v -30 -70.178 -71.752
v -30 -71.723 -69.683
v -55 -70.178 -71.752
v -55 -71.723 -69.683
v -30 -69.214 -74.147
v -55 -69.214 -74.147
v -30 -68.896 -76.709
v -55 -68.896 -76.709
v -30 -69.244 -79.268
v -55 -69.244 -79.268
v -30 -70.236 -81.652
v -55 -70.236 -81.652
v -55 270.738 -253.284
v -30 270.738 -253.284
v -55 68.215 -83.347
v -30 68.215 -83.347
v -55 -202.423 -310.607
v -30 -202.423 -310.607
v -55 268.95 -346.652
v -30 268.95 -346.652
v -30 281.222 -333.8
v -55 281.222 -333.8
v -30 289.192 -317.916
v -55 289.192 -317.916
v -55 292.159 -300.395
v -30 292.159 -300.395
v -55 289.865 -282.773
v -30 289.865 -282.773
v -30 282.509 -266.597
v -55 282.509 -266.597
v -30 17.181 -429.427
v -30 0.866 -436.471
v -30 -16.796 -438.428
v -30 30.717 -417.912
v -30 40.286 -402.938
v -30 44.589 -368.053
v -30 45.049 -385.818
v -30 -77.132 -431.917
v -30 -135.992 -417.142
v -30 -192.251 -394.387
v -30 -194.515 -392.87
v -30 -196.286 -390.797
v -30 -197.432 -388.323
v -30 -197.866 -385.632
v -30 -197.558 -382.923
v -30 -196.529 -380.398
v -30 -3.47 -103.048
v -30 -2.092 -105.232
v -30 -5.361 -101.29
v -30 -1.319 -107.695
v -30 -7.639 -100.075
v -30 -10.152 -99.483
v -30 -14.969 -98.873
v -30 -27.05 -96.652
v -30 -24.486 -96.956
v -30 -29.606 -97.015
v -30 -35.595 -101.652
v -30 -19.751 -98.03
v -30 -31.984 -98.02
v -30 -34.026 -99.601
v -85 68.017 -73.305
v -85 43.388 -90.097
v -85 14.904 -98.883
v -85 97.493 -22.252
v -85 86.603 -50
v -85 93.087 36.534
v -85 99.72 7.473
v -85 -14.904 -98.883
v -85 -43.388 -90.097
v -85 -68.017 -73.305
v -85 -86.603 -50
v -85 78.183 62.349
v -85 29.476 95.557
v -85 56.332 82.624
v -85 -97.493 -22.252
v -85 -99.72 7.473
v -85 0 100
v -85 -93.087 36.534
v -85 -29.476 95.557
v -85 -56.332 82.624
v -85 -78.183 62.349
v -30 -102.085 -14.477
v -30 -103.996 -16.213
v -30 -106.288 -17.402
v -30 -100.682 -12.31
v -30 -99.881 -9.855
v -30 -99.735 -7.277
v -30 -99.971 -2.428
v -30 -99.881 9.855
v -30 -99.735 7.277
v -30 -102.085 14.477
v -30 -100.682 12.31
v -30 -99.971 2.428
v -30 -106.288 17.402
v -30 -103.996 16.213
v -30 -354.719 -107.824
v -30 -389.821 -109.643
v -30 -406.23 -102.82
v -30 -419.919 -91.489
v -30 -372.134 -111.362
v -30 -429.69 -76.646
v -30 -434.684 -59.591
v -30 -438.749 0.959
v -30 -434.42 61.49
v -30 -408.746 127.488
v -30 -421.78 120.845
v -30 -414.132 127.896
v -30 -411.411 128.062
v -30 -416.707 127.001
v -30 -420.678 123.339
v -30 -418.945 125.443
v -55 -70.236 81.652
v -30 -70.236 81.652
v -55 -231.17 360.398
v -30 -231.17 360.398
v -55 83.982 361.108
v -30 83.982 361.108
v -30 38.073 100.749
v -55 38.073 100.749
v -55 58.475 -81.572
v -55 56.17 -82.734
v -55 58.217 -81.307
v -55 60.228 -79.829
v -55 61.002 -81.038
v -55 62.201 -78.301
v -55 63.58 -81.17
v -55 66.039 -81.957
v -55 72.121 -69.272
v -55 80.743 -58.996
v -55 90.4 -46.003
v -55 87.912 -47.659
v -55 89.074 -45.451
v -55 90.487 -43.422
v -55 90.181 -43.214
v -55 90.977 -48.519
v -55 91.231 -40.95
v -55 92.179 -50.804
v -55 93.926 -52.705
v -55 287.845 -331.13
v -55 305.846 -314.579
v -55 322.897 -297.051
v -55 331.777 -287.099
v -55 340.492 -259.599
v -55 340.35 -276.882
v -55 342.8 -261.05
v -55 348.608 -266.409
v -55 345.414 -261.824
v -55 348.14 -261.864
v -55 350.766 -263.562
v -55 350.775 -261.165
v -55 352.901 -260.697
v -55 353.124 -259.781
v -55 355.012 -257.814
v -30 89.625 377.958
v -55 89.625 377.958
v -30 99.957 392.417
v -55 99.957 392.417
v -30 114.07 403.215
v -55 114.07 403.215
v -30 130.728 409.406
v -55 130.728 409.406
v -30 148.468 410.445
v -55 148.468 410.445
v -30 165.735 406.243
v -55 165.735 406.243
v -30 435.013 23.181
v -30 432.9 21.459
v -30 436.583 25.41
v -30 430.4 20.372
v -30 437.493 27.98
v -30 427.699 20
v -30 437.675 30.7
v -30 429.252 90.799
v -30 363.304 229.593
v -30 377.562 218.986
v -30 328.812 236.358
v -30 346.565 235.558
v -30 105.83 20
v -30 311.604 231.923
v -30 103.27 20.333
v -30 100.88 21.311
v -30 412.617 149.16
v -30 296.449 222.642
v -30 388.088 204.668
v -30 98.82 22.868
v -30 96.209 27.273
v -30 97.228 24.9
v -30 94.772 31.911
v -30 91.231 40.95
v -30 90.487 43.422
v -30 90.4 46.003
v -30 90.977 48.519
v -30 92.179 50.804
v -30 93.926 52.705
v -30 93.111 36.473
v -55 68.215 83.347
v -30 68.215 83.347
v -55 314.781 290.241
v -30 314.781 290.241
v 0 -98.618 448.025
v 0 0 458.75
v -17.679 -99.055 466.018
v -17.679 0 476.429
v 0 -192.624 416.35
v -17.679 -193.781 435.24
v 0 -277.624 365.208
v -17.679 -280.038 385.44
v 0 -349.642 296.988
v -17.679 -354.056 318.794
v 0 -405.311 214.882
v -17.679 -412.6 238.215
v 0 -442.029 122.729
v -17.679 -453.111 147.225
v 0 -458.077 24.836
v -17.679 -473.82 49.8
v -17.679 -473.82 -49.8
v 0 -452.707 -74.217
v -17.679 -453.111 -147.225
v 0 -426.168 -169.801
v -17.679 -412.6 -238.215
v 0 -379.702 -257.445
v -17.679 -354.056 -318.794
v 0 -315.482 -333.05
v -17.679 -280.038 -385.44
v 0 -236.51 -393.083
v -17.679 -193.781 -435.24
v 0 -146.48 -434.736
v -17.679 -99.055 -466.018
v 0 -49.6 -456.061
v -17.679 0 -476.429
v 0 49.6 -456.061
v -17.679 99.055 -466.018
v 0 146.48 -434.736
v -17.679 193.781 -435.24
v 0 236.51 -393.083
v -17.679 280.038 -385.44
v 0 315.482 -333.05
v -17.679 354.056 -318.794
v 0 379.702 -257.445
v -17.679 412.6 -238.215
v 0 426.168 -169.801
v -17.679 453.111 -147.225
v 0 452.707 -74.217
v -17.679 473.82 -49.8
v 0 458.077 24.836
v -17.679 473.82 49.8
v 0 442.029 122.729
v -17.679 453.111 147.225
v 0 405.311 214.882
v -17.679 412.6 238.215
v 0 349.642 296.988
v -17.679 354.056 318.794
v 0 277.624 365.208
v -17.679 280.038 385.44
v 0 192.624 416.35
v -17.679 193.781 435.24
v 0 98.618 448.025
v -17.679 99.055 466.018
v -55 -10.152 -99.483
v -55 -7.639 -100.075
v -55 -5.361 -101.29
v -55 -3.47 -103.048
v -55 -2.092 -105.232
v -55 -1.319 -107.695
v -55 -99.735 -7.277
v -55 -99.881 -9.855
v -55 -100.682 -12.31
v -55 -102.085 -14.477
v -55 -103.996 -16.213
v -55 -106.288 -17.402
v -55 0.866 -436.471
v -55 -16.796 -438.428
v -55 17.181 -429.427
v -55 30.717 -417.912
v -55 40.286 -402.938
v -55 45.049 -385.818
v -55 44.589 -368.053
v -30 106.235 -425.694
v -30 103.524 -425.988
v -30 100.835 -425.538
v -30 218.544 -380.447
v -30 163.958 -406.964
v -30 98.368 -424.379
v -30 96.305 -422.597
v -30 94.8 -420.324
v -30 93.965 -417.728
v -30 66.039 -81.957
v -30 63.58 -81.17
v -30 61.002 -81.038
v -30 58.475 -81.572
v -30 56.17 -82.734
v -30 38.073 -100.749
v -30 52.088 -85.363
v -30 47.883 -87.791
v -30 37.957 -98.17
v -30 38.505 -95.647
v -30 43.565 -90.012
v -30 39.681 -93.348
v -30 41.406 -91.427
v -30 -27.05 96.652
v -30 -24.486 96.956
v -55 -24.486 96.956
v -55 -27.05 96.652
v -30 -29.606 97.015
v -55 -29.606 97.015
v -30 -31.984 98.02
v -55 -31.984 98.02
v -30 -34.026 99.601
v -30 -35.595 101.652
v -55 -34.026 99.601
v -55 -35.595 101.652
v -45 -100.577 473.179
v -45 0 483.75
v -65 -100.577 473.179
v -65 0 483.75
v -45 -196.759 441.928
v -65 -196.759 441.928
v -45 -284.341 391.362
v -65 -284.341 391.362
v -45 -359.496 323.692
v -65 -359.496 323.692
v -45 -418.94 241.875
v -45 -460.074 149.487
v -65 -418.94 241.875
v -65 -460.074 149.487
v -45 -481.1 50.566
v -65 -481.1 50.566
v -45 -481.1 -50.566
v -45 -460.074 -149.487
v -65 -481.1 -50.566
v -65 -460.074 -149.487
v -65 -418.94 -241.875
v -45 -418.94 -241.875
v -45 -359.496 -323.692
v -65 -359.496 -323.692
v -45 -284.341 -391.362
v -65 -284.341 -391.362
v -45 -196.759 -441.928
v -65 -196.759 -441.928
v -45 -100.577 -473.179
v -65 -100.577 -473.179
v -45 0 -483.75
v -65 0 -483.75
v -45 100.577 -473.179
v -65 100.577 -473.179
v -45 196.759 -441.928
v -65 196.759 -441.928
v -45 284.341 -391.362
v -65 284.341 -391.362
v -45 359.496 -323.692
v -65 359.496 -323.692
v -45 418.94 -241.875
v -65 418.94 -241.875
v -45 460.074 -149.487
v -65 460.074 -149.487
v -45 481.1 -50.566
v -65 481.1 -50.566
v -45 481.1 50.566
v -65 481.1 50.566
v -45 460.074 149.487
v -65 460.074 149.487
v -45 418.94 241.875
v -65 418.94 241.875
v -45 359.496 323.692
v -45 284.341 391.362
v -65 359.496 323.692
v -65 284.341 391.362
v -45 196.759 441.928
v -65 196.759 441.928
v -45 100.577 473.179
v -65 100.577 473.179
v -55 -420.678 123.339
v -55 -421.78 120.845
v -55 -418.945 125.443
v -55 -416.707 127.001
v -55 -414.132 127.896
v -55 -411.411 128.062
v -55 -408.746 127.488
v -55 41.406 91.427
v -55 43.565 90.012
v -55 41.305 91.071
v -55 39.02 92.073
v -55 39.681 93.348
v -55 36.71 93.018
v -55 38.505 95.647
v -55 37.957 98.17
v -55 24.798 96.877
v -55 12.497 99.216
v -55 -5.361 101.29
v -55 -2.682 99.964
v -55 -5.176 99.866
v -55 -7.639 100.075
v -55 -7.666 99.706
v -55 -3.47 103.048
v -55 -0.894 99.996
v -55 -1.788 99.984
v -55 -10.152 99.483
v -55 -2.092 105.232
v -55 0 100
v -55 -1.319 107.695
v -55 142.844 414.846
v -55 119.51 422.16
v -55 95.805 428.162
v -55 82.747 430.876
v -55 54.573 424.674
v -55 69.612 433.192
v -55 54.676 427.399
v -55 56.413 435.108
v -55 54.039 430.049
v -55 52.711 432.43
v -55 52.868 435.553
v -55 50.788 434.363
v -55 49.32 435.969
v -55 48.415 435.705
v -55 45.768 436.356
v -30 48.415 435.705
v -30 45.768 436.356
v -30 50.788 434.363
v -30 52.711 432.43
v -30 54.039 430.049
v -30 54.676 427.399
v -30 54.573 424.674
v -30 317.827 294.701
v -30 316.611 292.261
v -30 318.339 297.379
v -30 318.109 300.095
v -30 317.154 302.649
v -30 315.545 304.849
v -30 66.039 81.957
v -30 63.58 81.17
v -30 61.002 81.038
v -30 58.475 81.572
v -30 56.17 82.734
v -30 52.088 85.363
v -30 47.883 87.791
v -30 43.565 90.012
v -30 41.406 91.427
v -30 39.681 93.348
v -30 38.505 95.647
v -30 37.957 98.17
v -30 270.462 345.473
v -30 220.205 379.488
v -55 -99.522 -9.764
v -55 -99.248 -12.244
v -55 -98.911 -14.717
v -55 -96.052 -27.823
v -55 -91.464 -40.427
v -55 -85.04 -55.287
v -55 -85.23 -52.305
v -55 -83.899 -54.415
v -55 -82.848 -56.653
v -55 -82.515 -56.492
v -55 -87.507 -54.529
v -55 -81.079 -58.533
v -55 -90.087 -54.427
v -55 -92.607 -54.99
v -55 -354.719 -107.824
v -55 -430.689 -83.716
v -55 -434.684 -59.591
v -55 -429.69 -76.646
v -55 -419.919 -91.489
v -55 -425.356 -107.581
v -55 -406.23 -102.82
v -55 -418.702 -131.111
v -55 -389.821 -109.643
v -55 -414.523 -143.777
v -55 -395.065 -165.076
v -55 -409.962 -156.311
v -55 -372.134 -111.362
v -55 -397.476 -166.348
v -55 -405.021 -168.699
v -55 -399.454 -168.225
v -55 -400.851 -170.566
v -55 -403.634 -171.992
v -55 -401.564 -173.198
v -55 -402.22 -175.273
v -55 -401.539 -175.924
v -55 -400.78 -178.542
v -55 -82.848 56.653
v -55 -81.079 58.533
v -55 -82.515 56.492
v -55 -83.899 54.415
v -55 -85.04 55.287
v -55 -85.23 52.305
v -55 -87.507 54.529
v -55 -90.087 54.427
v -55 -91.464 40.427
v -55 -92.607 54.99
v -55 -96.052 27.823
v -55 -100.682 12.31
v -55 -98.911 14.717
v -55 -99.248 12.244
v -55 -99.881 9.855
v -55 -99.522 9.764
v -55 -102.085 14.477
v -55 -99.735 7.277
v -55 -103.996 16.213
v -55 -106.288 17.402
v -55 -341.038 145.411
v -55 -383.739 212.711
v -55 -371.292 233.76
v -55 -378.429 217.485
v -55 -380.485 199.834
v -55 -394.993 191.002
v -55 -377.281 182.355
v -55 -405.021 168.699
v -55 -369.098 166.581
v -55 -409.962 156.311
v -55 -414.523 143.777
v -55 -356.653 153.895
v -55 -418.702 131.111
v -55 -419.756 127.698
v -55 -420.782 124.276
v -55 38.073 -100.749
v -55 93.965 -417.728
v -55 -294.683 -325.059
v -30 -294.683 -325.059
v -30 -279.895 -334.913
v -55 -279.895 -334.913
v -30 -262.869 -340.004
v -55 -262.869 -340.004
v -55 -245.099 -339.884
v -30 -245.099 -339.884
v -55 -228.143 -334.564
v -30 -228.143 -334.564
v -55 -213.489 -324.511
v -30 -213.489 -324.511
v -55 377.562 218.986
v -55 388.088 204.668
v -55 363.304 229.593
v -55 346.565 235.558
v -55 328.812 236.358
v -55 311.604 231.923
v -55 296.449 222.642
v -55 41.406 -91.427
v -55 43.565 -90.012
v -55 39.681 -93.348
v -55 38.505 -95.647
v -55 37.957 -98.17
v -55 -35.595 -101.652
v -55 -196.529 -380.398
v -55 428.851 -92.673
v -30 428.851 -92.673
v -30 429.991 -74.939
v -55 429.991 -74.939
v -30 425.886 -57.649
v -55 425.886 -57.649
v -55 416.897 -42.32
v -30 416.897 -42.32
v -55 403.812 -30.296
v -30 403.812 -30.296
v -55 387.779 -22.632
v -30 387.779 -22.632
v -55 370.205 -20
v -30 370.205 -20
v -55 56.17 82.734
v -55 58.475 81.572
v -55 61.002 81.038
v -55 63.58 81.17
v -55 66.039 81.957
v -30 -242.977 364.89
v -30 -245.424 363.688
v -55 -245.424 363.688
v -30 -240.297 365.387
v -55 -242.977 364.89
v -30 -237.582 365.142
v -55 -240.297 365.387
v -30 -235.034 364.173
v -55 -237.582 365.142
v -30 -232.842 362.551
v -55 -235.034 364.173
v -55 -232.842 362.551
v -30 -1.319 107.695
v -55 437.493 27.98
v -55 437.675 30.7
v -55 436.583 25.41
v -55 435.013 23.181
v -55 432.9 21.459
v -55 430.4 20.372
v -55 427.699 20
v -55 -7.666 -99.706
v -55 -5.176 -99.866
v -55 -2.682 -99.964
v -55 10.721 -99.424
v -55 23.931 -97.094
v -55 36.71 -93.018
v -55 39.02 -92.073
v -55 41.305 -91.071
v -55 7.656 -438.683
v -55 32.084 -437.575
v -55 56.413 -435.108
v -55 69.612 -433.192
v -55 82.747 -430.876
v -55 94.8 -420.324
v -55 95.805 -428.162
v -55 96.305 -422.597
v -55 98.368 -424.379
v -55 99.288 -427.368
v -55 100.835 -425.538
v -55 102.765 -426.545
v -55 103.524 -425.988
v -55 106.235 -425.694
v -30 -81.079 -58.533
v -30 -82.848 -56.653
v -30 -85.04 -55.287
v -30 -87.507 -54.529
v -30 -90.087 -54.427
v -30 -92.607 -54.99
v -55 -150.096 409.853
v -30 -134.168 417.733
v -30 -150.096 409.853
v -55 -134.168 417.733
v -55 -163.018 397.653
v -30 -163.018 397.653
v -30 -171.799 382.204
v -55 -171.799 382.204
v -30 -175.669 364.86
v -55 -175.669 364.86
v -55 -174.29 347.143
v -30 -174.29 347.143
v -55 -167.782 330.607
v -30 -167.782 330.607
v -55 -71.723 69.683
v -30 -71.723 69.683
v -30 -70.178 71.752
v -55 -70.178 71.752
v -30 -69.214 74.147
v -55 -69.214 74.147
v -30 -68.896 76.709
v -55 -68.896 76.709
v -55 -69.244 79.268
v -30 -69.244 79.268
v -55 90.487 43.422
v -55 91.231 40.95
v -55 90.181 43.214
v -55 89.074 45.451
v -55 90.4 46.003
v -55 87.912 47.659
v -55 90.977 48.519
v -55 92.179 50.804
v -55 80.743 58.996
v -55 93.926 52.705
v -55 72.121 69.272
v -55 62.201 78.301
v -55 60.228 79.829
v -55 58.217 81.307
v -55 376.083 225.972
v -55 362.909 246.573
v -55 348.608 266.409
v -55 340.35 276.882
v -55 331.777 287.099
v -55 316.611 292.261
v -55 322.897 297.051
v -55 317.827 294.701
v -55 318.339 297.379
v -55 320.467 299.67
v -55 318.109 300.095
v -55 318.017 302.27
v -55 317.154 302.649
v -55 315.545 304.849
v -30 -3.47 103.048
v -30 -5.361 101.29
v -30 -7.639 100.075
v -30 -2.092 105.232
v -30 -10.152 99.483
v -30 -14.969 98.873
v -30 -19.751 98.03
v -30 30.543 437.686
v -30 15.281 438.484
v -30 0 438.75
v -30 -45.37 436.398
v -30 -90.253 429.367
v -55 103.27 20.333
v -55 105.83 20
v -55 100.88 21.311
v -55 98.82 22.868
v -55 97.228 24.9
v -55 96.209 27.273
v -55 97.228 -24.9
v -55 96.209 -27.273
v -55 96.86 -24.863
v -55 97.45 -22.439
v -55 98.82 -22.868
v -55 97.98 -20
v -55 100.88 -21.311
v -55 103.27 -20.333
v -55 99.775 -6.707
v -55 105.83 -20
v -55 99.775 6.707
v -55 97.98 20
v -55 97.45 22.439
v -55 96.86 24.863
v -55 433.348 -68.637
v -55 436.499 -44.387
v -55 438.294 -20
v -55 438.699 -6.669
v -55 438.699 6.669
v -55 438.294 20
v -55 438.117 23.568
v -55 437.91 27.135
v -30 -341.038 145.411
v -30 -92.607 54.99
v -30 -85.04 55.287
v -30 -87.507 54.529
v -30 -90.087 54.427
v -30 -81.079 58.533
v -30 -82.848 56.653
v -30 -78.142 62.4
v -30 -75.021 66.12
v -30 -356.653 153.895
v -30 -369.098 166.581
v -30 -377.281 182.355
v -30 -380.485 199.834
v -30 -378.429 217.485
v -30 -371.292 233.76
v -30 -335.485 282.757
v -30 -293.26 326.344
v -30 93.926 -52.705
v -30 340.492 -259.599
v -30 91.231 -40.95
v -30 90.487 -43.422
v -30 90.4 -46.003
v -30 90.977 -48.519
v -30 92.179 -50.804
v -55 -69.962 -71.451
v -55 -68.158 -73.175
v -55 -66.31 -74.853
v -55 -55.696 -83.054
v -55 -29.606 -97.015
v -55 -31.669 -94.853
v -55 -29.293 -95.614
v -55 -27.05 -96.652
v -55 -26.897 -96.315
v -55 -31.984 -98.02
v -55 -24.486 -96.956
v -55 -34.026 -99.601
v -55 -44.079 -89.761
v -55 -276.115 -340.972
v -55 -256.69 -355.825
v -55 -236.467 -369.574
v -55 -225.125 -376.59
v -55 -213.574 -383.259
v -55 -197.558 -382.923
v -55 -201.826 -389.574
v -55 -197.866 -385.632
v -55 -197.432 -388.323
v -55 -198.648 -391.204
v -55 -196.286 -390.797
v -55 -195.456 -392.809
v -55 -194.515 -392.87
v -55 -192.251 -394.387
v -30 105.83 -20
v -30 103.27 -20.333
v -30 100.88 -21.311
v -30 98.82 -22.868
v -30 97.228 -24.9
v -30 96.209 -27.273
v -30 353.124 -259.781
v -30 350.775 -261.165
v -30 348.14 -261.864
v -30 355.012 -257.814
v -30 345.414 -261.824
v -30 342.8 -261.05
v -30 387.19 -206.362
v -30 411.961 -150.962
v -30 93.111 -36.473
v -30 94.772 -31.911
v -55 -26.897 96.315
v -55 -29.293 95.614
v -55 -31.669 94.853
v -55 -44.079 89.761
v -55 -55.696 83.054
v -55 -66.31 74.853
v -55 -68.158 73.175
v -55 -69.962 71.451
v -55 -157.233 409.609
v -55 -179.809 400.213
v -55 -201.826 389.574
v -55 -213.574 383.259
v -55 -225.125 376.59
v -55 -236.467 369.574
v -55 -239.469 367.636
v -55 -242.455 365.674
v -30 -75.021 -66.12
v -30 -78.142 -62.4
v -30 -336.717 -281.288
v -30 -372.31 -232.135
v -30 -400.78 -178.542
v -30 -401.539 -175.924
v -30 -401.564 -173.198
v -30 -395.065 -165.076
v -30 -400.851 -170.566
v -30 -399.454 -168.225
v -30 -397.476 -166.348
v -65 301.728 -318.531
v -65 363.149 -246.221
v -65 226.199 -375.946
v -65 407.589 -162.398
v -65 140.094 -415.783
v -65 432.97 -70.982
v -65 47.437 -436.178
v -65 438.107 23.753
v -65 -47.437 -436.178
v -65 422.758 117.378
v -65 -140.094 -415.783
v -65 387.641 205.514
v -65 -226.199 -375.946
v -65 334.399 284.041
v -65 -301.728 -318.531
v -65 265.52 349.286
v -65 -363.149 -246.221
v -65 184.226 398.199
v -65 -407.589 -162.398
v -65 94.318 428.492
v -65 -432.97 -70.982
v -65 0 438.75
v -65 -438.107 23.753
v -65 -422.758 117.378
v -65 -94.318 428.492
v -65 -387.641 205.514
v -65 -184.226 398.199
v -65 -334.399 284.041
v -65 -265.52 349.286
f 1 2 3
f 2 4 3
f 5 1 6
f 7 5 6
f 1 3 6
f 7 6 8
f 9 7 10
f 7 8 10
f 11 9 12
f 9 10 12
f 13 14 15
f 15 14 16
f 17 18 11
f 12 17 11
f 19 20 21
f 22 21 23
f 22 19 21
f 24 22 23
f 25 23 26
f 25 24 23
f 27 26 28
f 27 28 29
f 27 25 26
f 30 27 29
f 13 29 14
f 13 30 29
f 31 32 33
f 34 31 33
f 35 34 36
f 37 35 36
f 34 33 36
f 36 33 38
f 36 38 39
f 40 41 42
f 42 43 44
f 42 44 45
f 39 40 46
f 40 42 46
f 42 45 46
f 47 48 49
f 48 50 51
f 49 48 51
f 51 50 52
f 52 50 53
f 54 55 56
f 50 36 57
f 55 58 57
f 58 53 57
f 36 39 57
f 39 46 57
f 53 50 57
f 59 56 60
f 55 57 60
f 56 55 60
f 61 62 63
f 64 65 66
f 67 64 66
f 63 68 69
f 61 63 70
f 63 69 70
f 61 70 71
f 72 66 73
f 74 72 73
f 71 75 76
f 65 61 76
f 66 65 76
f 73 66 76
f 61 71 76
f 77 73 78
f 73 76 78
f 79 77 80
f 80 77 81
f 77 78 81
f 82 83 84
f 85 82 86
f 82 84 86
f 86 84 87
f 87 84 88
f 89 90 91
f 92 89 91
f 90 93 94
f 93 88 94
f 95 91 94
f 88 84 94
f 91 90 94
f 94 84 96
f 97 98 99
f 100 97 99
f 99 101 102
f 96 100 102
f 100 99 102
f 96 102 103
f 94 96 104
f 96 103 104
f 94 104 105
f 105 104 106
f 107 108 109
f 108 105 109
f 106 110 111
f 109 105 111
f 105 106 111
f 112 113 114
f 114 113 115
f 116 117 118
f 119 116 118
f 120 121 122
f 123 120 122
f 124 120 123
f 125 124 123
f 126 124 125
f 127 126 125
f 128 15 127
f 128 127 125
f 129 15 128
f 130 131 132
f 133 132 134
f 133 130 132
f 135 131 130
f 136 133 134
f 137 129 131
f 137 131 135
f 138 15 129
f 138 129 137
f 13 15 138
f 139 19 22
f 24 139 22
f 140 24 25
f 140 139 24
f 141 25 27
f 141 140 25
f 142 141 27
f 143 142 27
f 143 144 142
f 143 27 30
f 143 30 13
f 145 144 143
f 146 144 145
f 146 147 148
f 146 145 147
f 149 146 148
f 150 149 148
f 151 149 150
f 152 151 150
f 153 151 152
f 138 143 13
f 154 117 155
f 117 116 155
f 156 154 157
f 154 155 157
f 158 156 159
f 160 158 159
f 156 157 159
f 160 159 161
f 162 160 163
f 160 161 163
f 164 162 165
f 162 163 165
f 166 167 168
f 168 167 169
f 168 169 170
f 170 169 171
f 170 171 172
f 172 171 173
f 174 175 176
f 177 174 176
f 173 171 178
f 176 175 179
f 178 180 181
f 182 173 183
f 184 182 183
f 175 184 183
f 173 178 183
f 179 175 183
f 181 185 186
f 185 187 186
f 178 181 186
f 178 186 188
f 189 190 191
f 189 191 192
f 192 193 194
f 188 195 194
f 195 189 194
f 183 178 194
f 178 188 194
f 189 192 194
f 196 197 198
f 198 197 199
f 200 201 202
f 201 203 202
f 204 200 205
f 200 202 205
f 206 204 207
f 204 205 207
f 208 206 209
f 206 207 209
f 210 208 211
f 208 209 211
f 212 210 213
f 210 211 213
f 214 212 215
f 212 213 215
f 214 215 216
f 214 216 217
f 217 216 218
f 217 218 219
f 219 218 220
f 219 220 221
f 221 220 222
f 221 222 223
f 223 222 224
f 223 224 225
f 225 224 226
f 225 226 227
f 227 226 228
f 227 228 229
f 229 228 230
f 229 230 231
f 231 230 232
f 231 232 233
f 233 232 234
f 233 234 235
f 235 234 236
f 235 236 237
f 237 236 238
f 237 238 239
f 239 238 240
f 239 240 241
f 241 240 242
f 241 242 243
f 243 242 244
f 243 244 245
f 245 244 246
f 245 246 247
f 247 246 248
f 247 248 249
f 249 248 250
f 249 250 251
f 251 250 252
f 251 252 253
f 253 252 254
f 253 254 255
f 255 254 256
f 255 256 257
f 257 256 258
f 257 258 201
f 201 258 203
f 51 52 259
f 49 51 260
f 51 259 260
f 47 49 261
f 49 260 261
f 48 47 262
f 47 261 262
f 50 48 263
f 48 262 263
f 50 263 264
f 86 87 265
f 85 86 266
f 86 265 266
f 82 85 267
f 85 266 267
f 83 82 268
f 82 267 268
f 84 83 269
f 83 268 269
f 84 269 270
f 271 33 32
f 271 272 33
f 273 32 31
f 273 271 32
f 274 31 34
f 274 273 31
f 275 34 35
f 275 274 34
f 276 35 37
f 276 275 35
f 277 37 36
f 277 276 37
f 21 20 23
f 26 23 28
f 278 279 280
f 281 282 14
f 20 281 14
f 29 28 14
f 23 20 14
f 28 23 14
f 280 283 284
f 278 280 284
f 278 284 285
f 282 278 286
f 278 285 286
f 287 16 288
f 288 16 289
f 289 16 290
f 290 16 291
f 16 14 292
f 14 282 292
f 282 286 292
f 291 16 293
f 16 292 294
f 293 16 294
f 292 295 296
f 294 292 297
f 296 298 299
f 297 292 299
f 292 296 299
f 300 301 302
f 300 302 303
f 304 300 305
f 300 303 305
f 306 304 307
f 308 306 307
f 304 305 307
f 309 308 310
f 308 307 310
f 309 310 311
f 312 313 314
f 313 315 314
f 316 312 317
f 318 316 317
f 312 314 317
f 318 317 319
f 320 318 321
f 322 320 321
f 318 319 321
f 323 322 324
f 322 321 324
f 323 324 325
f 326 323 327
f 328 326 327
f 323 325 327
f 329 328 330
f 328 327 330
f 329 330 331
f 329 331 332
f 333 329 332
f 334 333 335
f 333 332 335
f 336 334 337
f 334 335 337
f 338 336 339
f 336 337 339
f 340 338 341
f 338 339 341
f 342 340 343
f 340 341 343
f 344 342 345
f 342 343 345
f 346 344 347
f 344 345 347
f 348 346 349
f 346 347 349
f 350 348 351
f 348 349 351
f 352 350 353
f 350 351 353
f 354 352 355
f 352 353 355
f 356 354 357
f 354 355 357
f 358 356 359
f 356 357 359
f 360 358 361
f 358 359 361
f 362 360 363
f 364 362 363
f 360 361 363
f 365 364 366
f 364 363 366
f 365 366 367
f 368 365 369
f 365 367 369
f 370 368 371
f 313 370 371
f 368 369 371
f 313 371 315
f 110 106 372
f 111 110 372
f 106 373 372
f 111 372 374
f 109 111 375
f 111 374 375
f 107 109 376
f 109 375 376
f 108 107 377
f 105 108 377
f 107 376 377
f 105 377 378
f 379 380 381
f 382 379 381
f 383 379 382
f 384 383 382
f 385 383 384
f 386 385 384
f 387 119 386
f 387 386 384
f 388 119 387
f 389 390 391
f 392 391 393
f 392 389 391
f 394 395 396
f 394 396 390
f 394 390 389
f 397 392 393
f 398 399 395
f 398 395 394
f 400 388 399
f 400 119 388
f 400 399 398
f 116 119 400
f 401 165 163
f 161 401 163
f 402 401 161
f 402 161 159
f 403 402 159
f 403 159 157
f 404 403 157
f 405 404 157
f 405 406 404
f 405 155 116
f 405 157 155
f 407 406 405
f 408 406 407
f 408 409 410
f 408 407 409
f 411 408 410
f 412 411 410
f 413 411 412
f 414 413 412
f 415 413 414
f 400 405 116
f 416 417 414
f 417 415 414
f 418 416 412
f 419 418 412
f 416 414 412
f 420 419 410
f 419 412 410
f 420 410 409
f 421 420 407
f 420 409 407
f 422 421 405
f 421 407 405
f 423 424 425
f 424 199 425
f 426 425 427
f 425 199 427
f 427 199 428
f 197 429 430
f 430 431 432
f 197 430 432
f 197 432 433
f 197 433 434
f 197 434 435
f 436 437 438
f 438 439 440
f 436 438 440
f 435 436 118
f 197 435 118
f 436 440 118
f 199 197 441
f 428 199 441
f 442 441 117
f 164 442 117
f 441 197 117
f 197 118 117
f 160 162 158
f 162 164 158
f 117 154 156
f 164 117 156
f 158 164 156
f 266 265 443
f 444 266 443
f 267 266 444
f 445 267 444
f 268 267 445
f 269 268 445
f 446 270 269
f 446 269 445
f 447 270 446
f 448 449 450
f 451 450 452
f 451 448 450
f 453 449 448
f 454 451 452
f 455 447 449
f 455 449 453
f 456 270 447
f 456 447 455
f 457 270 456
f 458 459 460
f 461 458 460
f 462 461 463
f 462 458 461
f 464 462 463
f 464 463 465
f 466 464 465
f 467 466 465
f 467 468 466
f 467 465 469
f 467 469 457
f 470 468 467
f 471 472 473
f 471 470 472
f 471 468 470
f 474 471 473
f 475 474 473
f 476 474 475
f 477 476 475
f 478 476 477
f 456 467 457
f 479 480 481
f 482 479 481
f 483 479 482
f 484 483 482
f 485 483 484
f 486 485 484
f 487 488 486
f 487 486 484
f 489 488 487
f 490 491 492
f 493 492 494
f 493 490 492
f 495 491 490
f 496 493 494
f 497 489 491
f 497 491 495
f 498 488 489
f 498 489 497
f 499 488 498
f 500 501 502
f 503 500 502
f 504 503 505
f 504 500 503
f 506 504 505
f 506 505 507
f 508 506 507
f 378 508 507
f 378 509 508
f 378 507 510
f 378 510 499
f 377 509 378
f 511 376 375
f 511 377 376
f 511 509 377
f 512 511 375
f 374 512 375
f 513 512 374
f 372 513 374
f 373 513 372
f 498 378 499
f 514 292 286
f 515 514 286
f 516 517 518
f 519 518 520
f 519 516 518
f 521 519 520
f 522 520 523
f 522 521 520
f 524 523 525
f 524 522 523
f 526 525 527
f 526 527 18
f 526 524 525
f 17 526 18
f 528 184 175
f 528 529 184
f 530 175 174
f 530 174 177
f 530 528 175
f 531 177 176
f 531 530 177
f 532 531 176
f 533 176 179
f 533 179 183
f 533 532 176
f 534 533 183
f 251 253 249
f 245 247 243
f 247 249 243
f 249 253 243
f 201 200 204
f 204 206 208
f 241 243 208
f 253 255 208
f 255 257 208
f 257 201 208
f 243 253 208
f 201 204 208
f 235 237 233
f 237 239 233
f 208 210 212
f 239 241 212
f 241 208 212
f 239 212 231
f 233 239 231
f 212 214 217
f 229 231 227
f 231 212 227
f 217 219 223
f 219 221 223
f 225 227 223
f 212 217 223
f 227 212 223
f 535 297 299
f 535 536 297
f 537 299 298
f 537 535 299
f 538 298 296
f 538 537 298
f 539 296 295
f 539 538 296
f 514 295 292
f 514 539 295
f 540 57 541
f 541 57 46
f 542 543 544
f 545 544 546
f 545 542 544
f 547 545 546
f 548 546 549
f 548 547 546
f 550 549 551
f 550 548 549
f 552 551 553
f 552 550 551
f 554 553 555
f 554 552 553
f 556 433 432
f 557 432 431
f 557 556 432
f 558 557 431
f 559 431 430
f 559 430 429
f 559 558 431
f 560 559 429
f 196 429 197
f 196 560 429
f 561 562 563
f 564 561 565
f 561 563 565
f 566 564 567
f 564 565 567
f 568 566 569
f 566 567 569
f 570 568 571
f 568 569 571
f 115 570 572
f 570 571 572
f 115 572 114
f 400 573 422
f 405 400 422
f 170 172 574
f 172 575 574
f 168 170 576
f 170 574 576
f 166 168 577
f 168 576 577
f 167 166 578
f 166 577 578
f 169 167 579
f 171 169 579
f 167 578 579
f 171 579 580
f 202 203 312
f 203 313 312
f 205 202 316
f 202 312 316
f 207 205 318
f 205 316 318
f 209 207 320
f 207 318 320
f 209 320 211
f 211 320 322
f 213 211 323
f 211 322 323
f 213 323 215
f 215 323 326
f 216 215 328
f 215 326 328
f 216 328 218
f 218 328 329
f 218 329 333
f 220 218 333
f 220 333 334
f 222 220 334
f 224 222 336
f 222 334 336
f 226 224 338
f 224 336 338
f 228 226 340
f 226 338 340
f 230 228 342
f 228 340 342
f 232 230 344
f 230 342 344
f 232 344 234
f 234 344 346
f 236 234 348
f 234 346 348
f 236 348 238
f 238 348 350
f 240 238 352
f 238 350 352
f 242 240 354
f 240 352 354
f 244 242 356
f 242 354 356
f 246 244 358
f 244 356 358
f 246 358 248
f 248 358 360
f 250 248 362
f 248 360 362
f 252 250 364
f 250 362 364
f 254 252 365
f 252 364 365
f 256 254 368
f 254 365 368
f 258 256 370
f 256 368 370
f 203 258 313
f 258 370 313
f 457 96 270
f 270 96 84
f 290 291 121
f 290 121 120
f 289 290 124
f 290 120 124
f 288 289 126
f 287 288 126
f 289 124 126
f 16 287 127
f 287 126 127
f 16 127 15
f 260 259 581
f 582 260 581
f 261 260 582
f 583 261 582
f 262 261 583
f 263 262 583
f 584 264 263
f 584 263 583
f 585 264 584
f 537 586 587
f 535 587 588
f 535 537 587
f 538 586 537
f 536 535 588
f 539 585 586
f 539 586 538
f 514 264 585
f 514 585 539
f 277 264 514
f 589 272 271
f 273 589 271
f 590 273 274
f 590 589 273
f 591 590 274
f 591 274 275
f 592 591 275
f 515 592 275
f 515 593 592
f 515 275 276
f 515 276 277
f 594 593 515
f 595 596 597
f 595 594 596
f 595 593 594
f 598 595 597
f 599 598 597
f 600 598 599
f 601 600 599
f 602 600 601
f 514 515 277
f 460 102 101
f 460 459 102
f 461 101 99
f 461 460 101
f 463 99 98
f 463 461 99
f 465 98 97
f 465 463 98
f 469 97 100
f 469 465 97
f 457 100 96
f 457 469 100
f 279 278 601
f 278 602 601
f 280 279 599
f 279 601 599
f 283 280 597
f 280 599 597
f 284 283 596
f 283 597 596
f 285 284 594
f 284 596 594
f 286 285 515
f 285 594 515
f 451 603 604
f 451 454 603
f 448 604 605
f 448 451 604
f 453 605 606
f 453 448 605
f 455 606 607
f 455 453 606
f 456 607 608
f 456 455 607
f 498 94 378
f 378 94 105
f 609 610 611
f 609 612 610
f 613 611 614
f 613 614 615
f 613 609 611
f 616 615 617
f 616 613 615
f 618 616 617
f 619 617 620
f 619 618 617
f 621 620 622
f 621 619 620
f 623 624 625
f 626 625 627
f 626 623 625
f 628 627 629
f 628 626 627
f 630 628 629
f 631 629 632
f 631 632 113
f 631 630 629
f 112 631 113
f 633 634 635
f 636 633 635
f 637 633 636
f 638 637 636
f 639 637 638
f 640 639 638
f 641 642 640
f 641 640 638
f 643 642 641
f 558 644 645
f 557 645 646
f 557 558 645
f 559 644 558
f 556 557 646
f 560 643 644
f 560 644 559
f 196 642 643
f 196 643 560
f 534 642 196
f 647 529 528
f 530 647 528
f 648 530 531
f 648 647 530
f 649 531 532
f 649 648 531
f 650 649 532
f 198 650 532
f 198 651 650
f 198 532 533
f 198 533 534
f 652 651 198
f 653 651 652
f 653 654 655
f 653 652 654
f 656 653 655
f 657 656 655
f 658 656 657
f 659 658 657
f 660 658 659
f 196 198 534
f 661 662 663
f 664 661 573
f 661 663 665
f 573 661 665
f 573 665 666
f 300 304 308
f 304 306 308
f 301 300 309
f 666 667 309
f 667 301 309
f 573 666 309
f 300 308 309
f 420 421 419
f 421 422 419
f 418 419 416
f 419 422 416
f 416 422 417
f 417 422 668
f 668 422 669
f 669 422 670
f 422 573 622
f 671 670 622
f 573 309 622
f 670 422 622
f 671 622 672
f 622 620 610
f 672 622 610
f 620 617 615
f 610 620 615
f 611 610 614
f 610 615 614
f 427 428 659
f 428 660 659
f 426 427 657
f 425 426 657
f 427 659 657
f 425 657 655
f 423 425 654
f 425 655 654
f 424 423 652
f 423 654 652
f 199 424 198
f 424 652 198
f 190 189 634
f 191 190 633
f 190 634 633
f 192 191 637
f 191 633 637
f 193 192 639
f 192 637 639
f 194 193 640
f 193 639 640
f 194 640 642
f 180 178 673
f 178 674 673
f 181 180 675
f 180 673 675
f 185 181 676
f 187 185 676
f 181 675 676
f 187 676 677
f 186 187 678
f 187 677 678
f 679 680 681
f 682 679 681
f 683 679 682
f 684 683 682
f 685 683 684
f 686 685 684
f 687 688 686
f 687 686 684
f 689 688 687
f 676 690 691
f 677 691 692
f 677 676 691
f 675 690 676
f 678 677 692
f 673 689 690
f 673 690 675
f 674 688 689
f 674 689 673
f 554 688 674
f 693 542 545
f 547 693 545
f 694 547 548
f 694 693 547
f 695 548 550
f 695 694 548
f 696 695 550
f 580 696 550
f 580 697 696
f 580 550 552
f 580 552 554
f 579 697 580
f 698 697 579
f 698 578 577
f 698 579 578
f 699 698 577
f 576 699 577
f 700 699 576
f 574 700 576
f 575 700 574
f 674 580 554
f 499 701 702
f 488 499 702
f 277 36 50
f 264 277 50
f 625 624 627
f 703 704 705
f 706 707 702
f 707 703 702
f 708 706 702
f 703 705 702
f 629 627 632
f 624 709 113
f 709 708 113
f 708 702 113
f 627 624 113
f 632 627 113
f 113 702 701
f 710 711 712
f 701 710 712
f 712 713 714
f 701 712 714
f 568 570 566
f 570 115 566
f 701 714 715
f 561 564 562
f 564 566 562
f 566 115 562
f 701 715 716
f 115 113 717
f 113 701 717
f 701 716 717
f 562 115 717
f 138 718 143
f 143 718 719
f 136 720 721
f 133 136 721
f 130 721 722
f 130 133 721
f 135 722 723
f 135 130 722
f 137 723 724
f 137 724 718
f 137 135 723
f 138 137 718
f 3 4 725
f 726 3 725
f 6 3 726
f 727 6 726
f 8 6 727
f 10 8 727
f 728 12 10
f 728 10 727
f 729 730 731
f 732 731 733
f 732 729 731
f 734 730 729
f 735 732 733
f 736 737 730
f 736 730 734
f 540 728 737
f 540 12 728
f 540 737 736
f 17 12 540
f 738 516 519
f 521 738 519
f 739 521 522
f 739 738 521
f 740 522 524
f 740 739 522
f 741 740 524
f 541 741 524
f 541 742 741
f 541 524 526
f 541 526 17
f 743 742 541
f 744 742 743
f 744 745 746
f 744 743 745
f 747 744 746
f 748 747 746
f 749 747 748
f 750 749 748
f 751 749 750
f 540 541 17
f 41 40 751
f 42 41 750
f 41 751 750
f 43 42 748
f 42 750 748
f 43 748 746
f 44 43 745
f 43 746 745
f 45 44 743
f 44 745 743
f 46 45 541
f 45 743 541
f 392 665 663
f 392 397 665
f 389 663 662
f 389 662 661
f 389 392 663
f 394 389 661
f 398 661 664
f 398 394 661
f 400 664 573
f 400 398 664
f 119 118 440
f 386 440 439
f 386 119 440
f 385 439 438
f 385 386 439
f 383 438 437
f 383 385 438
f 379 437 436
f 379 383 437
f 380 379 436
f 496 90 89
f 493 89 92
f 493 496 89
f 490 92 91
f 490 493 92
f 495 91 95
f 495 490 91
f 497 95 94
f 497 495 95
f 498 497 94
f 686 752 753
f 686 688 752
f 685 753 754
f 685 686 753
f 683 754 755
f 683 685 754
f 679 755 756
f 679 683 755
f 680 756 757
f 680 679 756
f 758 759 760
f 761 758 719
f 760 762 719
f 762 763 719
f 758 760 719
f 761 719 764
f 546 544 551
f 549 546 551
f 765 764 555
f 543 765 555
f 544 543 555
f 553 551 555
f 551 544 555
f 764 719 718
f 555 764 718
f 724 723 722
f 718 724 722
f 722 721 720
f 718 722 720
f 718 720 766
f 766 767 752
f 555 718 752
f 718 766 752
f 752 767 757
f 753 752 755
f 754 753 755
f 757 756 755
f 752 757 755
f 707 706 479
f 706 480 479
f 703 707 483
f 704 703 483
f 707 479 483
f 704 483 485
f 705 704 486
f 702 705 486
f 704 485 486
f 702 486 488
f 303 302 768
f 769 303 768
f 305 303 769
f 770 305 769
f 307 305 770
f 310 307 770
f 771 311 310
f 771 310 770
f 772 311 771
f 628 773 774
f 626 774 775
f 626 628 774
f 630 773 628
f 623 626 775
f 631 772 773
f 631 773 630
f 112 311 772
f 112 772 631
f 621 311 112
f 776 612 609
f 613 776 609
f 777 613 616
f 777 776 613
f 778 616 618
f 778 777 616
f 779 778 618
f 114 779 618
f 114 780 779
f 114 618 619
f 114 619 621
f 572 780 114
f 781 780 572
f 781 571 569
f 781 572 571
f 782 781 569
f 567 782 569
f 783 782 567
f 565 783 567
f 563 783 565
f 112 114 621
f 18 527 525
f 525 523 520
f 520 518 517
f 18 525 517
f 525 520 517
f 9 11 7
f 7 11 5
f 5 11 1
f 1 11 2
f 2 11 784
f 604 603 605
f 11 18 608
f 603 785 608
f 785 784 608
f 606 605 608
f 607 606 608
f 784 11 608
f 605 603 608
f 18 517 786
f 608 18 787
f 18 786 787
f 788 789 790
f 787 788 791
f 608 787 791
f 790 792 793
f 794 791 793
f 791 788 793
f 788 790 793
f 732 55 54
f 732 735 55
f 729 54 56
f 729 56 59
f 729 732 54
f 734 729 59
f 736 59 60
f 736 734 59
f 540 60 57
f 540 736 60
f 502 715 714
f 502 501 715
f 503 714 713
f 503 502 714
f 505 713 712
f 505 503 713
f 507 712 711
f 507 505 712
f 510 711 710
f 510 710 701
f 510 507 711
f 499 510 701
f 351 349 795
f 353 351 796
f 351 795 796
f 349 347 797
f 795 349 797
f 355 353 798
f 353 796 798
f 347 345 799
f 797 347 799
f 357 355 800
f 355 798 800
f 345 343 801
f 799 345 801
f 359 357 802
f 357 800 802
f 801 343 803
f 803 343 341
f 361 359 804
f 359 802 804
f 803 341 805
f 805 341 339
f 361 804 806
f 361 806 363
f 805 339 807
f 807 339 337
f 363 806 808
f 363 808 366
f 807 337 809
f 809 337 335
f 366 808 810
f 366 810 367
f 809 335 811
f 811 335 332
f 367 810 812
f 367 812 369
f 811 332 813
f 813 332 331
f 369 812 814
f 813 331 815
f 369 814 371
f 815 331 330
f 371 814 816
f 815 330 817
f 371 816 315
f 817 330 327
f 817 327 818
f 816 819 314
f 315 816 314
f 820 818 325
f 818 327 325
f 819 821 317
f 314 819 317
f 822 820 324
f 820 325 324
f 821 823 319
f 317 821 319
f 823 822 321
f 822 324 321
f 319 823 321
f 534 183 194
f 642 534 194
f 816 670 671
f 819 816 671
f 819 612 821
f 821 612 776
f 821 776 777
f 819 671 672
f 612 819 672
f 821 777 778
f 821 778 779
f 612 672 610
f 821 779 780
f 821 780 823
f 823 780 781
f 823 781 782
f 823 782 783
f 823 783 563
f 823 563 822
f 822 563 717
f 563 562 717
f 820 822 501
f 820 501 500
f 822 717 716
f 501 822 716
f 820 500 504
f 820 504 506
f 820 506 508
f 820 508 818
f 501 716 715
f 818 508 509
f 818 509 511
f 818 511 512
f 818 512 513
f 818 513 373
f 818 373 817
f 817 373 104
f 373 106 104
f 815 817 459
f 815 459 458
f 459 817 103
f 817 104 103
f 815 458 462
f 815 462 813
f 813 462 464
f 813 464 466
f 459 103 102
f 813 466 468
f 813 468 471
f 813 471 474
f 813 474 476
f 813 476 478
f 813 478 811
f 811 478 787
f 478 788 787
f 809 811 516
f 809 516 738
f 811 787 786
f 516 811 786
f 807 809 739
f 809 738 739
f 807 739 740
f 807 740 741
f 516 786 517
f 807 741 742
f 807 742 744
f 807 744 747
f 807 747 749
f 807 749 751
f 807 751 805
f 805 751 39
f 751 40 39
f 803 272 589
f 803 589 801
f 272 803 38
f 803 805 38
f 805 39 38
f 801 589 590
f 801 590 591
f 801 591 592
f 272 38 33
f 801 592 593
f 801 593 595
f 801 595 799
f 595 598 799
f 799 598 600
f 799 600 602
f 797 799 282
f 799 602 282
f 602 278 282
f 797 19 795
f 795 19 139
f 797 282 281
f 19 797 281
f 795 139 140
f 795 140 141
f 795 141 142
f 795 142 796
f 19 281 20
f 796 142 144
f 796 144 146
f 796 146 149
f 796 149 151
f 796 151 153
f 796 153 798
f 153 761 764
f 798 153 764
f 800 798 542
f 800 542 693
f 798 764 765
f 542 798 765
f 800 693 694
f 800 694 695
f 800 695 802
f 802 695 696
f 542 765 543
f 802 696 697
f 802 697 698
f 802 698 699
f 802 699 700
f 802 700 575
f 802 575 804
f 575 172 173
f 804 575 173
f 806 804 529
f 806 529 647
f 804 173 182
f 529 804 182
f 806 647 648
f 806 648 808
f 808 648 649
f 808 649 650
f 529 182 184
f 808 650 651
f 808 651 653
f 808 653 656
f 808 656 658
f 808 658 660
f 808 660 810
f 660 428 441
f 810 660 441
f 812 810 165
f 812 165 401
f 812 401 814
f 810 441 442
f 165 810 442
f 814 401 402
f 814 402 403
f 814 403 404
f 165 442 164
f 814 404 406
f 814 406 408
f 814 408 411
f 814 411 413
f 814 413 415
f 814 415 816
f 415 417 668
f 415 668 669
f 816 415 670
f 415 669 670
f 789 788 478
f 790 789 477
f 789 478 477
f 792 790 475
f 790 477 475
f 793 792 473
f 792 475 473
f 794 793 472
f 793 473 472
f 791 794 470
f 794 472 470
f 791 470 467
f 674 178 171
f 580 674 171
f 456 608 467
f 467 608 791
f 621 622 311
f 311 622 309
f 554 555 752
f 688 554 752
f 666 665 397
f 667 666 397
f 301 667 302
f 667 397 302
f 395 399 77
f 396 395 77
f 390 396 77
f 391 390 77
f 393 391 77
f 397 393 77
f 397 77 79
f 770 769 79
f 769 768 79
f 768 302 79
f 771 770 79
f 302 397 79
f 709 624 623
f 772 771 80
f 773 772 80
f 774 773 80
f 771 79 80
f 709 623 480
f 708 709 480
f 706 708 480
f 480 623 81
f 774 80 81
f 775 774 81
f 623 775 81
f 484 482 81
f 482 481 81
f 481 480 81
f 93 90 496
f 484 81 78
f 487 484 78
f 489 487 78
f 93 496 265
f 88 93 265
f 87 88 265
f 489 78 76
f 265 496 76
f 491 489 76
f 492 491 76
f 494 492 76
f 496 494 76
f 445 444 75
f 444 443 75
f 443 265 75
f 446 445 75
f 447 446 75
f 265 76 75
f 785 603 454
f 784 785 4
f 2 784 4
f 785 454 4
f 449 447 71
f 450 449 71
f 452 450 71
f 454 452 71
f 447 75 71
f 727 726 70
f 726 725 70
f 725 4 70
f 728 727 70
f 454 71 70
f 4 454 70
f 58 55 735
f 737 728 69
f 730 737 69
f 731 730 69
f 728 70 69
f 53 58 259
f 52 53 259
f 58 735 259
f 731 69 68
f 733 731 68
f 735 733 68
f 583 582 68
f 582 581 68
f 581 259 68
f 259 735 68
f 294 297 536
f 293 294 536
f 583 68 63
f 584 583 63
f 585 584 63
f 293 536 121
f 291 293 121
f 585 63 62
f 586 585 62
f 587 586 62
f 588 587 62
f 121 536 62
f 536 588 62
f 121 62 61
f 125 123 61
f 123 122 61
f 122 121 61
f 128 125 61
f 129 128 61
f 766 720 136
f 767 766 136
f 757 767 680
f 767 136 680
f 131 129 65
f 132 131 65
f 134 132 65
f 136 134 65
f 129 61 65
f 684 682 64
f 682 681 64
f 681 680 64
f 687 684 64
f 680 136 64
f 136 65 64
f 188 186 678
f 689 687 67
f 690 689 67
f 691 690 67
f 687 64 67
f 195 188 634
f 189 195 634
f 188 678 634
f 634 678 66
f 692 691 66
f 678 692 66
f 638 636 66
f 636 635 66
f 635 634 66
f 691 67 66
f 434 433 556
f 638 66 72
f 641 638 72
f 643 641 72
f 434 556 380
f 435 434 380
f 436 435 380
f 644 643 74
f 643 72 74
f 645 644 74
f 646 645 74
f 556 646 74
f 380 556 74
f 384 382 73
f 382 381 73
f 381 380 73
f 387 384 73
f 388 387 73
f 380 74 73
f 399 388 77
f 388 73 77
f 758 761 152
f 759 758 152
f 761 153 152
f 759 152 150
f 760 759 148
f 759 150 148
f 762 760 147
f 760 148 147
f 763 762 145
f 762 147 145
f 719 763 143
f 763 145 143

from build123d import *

# Parameters (mm, degrees)
EXTRUDE_1_DEPTH                  = 25
FILLET_3_R                       = 60
FILLET_4_R                       = 10
PATTERN_CIRCULAR_1_COUNT         = 9
FILLET_3_OF_PATTERN_CIRCULAR_1_R = 60
FILLET_4_OF_PATTERN_CIRCULAR_1_R = 10


with BuildPart() as part:
    # 草图1 → 旋转1 (revolve)
    with BuildSketch(Plane.XY, mode=Mode.PRIVATE) as revolve_1_sk:
        Polygon((0, 0), (0, 458.75), (-17.679491924, 476.429491924), (-45, 483.75), (-65, 483.75), (-65, 438.75), (-30, 438.75), (-30, 100), (-85, 100), (-85, 0), align=None)
    revolve(revolve_1_sk.sketch.rotate(Axis((-619.297947583, 0, 0), (1, 0, 0)), 90), axis=Axis((-619.297947583, 0, 0), (1, 0, 0)))

    # 草图3 → 凸台-拉伸1 (add)
    with BuildSketch(Plane.ZY.offset(30)):
        with BuildLine():
            ThreePointArc((20, 438.2939225), (0, 438.75), (-20, 438.2939225))
            Line((-20, 438.2939225), (-20, 97.979589711))
            ThreePointArc((-20, 97.979589711), (0, 100), (20, 97.979589711))
            Line((20, 97.979589711), (20, 438.2939225))
        make_face()
    extrude_1 = extrude(amount=EXTRUDE_1_DEPTH)

    # 圆角3
    fillet_3_edges = [part.edges().sort_by_distance(p)[0] for p in [
        (-42.5, 438.2939225, -20),
    ]]
    fillet(fillet_3_edges, radius=FILLET_3_R)

    # 圆角4
    fillet_4_edges = [part.edges().sort_by_distance(p)[0] for p in [
        (-42.5, 438.2939225, 20),
        (-42.5, 97.979589711, 20),
        (-42.5, 97.979589711, -20),
    ]]
    fillet(fillet_4_edges, radius=FILLET_4_R)

    # 阵列(圆周)1: 凸台-拉伸1 ×9 about axis
    pattern_circular_1_axis = Axis((0, 0, 0), (1, 0, 0))
    for i in range(1, PATTERN_CIRCULAR_1_COUNT):
        add(extrude_1.rotate(pattern_circular_1_axis, i * 360 / PATTERN_CIRCULAR_1_COUNT))

    # 圆角3 of 阵列(圆周)1
    fillet_3_of_pattern_circular_1_edges = [part.edges().sort_by_distance(p)[0] for p in [
        (-42.5, 348.608375977, 266.409013921),
        (-42.5, 95.805095985, 428.162289422),
        (-42.5, -201.826453174, 389.573671209),
        (-42.5, -405.021161842, 168.699202608),
        (-42.5, -418.701967575, -131.111497776),
        (-42.5, -236.467469325, -369.573671209),
        (-42.5, 56.412785864, -435.108216529),
        (-42.5, 322.89687159, -297.050791646),
    ]]
    fillet(fillet_3_of_pattern_circular_1_edges, radius=FILLET_3_OF_PATTERN_CIRCULAR_1_R)

    # 圆角4 of 阵列(圆周)1
    fillet_4_of_pattern_circular_1_edges = [part.edges().sort_by_distance(p)[0] for p in [
        (-42.5, 322.89687159, 297.050791646),
        (-42.5, 62.200968044, 78.300955131),
        (-42.5, 87.912472431, 47.659177406),
        (-42.5, 56.412785864, 435.108216529),
        (-42.5, -2.682177858, 99.964023138),
        (-42.5, 36.710132262, 93.018096031),
        (-42.5, -236.467469325, 369.573671209),
        (-42.5, -66.310302931, 74.852813742),
        (-42.5, -31.66928678, 94.852813742),
        (-42.5, -418.701967575, 131.111497776),
        (-42.5, -98.911100306, 14.7171409),
        (-42.5, -85.230294573, 52.304845732),
        (-42.5, -405.021161842, -168.699202608),
        (-42.5, -85.230294573, -52.304845732),
        (-42.5, -98.911100306, -14.7171409),
        (-42.5, -201.826453174, -389.573671209),
        (-42.5, -31.66928678, -94.852813742),
        (-42.5, -66.310302931, -74.852813742),
        (-42.5, 95.805095985, -428.162289422),
        (-42.5, 36.710132262, -93.018096031),
        (-42.5, -2.682177858, -99.964023138),
        (-42.5, 348.608375977, -266.409013921),
        (-42.5, 87.912472431, -47.659177406),
        (-42.5, 62.200968044, -78.300955131),
    ]]
    fillet(fillet_4_of_pattern_circular_1_edges, radius=FILLET_4_OF_PATTERN_CIRCULAR_1_R)


solid = part.part
